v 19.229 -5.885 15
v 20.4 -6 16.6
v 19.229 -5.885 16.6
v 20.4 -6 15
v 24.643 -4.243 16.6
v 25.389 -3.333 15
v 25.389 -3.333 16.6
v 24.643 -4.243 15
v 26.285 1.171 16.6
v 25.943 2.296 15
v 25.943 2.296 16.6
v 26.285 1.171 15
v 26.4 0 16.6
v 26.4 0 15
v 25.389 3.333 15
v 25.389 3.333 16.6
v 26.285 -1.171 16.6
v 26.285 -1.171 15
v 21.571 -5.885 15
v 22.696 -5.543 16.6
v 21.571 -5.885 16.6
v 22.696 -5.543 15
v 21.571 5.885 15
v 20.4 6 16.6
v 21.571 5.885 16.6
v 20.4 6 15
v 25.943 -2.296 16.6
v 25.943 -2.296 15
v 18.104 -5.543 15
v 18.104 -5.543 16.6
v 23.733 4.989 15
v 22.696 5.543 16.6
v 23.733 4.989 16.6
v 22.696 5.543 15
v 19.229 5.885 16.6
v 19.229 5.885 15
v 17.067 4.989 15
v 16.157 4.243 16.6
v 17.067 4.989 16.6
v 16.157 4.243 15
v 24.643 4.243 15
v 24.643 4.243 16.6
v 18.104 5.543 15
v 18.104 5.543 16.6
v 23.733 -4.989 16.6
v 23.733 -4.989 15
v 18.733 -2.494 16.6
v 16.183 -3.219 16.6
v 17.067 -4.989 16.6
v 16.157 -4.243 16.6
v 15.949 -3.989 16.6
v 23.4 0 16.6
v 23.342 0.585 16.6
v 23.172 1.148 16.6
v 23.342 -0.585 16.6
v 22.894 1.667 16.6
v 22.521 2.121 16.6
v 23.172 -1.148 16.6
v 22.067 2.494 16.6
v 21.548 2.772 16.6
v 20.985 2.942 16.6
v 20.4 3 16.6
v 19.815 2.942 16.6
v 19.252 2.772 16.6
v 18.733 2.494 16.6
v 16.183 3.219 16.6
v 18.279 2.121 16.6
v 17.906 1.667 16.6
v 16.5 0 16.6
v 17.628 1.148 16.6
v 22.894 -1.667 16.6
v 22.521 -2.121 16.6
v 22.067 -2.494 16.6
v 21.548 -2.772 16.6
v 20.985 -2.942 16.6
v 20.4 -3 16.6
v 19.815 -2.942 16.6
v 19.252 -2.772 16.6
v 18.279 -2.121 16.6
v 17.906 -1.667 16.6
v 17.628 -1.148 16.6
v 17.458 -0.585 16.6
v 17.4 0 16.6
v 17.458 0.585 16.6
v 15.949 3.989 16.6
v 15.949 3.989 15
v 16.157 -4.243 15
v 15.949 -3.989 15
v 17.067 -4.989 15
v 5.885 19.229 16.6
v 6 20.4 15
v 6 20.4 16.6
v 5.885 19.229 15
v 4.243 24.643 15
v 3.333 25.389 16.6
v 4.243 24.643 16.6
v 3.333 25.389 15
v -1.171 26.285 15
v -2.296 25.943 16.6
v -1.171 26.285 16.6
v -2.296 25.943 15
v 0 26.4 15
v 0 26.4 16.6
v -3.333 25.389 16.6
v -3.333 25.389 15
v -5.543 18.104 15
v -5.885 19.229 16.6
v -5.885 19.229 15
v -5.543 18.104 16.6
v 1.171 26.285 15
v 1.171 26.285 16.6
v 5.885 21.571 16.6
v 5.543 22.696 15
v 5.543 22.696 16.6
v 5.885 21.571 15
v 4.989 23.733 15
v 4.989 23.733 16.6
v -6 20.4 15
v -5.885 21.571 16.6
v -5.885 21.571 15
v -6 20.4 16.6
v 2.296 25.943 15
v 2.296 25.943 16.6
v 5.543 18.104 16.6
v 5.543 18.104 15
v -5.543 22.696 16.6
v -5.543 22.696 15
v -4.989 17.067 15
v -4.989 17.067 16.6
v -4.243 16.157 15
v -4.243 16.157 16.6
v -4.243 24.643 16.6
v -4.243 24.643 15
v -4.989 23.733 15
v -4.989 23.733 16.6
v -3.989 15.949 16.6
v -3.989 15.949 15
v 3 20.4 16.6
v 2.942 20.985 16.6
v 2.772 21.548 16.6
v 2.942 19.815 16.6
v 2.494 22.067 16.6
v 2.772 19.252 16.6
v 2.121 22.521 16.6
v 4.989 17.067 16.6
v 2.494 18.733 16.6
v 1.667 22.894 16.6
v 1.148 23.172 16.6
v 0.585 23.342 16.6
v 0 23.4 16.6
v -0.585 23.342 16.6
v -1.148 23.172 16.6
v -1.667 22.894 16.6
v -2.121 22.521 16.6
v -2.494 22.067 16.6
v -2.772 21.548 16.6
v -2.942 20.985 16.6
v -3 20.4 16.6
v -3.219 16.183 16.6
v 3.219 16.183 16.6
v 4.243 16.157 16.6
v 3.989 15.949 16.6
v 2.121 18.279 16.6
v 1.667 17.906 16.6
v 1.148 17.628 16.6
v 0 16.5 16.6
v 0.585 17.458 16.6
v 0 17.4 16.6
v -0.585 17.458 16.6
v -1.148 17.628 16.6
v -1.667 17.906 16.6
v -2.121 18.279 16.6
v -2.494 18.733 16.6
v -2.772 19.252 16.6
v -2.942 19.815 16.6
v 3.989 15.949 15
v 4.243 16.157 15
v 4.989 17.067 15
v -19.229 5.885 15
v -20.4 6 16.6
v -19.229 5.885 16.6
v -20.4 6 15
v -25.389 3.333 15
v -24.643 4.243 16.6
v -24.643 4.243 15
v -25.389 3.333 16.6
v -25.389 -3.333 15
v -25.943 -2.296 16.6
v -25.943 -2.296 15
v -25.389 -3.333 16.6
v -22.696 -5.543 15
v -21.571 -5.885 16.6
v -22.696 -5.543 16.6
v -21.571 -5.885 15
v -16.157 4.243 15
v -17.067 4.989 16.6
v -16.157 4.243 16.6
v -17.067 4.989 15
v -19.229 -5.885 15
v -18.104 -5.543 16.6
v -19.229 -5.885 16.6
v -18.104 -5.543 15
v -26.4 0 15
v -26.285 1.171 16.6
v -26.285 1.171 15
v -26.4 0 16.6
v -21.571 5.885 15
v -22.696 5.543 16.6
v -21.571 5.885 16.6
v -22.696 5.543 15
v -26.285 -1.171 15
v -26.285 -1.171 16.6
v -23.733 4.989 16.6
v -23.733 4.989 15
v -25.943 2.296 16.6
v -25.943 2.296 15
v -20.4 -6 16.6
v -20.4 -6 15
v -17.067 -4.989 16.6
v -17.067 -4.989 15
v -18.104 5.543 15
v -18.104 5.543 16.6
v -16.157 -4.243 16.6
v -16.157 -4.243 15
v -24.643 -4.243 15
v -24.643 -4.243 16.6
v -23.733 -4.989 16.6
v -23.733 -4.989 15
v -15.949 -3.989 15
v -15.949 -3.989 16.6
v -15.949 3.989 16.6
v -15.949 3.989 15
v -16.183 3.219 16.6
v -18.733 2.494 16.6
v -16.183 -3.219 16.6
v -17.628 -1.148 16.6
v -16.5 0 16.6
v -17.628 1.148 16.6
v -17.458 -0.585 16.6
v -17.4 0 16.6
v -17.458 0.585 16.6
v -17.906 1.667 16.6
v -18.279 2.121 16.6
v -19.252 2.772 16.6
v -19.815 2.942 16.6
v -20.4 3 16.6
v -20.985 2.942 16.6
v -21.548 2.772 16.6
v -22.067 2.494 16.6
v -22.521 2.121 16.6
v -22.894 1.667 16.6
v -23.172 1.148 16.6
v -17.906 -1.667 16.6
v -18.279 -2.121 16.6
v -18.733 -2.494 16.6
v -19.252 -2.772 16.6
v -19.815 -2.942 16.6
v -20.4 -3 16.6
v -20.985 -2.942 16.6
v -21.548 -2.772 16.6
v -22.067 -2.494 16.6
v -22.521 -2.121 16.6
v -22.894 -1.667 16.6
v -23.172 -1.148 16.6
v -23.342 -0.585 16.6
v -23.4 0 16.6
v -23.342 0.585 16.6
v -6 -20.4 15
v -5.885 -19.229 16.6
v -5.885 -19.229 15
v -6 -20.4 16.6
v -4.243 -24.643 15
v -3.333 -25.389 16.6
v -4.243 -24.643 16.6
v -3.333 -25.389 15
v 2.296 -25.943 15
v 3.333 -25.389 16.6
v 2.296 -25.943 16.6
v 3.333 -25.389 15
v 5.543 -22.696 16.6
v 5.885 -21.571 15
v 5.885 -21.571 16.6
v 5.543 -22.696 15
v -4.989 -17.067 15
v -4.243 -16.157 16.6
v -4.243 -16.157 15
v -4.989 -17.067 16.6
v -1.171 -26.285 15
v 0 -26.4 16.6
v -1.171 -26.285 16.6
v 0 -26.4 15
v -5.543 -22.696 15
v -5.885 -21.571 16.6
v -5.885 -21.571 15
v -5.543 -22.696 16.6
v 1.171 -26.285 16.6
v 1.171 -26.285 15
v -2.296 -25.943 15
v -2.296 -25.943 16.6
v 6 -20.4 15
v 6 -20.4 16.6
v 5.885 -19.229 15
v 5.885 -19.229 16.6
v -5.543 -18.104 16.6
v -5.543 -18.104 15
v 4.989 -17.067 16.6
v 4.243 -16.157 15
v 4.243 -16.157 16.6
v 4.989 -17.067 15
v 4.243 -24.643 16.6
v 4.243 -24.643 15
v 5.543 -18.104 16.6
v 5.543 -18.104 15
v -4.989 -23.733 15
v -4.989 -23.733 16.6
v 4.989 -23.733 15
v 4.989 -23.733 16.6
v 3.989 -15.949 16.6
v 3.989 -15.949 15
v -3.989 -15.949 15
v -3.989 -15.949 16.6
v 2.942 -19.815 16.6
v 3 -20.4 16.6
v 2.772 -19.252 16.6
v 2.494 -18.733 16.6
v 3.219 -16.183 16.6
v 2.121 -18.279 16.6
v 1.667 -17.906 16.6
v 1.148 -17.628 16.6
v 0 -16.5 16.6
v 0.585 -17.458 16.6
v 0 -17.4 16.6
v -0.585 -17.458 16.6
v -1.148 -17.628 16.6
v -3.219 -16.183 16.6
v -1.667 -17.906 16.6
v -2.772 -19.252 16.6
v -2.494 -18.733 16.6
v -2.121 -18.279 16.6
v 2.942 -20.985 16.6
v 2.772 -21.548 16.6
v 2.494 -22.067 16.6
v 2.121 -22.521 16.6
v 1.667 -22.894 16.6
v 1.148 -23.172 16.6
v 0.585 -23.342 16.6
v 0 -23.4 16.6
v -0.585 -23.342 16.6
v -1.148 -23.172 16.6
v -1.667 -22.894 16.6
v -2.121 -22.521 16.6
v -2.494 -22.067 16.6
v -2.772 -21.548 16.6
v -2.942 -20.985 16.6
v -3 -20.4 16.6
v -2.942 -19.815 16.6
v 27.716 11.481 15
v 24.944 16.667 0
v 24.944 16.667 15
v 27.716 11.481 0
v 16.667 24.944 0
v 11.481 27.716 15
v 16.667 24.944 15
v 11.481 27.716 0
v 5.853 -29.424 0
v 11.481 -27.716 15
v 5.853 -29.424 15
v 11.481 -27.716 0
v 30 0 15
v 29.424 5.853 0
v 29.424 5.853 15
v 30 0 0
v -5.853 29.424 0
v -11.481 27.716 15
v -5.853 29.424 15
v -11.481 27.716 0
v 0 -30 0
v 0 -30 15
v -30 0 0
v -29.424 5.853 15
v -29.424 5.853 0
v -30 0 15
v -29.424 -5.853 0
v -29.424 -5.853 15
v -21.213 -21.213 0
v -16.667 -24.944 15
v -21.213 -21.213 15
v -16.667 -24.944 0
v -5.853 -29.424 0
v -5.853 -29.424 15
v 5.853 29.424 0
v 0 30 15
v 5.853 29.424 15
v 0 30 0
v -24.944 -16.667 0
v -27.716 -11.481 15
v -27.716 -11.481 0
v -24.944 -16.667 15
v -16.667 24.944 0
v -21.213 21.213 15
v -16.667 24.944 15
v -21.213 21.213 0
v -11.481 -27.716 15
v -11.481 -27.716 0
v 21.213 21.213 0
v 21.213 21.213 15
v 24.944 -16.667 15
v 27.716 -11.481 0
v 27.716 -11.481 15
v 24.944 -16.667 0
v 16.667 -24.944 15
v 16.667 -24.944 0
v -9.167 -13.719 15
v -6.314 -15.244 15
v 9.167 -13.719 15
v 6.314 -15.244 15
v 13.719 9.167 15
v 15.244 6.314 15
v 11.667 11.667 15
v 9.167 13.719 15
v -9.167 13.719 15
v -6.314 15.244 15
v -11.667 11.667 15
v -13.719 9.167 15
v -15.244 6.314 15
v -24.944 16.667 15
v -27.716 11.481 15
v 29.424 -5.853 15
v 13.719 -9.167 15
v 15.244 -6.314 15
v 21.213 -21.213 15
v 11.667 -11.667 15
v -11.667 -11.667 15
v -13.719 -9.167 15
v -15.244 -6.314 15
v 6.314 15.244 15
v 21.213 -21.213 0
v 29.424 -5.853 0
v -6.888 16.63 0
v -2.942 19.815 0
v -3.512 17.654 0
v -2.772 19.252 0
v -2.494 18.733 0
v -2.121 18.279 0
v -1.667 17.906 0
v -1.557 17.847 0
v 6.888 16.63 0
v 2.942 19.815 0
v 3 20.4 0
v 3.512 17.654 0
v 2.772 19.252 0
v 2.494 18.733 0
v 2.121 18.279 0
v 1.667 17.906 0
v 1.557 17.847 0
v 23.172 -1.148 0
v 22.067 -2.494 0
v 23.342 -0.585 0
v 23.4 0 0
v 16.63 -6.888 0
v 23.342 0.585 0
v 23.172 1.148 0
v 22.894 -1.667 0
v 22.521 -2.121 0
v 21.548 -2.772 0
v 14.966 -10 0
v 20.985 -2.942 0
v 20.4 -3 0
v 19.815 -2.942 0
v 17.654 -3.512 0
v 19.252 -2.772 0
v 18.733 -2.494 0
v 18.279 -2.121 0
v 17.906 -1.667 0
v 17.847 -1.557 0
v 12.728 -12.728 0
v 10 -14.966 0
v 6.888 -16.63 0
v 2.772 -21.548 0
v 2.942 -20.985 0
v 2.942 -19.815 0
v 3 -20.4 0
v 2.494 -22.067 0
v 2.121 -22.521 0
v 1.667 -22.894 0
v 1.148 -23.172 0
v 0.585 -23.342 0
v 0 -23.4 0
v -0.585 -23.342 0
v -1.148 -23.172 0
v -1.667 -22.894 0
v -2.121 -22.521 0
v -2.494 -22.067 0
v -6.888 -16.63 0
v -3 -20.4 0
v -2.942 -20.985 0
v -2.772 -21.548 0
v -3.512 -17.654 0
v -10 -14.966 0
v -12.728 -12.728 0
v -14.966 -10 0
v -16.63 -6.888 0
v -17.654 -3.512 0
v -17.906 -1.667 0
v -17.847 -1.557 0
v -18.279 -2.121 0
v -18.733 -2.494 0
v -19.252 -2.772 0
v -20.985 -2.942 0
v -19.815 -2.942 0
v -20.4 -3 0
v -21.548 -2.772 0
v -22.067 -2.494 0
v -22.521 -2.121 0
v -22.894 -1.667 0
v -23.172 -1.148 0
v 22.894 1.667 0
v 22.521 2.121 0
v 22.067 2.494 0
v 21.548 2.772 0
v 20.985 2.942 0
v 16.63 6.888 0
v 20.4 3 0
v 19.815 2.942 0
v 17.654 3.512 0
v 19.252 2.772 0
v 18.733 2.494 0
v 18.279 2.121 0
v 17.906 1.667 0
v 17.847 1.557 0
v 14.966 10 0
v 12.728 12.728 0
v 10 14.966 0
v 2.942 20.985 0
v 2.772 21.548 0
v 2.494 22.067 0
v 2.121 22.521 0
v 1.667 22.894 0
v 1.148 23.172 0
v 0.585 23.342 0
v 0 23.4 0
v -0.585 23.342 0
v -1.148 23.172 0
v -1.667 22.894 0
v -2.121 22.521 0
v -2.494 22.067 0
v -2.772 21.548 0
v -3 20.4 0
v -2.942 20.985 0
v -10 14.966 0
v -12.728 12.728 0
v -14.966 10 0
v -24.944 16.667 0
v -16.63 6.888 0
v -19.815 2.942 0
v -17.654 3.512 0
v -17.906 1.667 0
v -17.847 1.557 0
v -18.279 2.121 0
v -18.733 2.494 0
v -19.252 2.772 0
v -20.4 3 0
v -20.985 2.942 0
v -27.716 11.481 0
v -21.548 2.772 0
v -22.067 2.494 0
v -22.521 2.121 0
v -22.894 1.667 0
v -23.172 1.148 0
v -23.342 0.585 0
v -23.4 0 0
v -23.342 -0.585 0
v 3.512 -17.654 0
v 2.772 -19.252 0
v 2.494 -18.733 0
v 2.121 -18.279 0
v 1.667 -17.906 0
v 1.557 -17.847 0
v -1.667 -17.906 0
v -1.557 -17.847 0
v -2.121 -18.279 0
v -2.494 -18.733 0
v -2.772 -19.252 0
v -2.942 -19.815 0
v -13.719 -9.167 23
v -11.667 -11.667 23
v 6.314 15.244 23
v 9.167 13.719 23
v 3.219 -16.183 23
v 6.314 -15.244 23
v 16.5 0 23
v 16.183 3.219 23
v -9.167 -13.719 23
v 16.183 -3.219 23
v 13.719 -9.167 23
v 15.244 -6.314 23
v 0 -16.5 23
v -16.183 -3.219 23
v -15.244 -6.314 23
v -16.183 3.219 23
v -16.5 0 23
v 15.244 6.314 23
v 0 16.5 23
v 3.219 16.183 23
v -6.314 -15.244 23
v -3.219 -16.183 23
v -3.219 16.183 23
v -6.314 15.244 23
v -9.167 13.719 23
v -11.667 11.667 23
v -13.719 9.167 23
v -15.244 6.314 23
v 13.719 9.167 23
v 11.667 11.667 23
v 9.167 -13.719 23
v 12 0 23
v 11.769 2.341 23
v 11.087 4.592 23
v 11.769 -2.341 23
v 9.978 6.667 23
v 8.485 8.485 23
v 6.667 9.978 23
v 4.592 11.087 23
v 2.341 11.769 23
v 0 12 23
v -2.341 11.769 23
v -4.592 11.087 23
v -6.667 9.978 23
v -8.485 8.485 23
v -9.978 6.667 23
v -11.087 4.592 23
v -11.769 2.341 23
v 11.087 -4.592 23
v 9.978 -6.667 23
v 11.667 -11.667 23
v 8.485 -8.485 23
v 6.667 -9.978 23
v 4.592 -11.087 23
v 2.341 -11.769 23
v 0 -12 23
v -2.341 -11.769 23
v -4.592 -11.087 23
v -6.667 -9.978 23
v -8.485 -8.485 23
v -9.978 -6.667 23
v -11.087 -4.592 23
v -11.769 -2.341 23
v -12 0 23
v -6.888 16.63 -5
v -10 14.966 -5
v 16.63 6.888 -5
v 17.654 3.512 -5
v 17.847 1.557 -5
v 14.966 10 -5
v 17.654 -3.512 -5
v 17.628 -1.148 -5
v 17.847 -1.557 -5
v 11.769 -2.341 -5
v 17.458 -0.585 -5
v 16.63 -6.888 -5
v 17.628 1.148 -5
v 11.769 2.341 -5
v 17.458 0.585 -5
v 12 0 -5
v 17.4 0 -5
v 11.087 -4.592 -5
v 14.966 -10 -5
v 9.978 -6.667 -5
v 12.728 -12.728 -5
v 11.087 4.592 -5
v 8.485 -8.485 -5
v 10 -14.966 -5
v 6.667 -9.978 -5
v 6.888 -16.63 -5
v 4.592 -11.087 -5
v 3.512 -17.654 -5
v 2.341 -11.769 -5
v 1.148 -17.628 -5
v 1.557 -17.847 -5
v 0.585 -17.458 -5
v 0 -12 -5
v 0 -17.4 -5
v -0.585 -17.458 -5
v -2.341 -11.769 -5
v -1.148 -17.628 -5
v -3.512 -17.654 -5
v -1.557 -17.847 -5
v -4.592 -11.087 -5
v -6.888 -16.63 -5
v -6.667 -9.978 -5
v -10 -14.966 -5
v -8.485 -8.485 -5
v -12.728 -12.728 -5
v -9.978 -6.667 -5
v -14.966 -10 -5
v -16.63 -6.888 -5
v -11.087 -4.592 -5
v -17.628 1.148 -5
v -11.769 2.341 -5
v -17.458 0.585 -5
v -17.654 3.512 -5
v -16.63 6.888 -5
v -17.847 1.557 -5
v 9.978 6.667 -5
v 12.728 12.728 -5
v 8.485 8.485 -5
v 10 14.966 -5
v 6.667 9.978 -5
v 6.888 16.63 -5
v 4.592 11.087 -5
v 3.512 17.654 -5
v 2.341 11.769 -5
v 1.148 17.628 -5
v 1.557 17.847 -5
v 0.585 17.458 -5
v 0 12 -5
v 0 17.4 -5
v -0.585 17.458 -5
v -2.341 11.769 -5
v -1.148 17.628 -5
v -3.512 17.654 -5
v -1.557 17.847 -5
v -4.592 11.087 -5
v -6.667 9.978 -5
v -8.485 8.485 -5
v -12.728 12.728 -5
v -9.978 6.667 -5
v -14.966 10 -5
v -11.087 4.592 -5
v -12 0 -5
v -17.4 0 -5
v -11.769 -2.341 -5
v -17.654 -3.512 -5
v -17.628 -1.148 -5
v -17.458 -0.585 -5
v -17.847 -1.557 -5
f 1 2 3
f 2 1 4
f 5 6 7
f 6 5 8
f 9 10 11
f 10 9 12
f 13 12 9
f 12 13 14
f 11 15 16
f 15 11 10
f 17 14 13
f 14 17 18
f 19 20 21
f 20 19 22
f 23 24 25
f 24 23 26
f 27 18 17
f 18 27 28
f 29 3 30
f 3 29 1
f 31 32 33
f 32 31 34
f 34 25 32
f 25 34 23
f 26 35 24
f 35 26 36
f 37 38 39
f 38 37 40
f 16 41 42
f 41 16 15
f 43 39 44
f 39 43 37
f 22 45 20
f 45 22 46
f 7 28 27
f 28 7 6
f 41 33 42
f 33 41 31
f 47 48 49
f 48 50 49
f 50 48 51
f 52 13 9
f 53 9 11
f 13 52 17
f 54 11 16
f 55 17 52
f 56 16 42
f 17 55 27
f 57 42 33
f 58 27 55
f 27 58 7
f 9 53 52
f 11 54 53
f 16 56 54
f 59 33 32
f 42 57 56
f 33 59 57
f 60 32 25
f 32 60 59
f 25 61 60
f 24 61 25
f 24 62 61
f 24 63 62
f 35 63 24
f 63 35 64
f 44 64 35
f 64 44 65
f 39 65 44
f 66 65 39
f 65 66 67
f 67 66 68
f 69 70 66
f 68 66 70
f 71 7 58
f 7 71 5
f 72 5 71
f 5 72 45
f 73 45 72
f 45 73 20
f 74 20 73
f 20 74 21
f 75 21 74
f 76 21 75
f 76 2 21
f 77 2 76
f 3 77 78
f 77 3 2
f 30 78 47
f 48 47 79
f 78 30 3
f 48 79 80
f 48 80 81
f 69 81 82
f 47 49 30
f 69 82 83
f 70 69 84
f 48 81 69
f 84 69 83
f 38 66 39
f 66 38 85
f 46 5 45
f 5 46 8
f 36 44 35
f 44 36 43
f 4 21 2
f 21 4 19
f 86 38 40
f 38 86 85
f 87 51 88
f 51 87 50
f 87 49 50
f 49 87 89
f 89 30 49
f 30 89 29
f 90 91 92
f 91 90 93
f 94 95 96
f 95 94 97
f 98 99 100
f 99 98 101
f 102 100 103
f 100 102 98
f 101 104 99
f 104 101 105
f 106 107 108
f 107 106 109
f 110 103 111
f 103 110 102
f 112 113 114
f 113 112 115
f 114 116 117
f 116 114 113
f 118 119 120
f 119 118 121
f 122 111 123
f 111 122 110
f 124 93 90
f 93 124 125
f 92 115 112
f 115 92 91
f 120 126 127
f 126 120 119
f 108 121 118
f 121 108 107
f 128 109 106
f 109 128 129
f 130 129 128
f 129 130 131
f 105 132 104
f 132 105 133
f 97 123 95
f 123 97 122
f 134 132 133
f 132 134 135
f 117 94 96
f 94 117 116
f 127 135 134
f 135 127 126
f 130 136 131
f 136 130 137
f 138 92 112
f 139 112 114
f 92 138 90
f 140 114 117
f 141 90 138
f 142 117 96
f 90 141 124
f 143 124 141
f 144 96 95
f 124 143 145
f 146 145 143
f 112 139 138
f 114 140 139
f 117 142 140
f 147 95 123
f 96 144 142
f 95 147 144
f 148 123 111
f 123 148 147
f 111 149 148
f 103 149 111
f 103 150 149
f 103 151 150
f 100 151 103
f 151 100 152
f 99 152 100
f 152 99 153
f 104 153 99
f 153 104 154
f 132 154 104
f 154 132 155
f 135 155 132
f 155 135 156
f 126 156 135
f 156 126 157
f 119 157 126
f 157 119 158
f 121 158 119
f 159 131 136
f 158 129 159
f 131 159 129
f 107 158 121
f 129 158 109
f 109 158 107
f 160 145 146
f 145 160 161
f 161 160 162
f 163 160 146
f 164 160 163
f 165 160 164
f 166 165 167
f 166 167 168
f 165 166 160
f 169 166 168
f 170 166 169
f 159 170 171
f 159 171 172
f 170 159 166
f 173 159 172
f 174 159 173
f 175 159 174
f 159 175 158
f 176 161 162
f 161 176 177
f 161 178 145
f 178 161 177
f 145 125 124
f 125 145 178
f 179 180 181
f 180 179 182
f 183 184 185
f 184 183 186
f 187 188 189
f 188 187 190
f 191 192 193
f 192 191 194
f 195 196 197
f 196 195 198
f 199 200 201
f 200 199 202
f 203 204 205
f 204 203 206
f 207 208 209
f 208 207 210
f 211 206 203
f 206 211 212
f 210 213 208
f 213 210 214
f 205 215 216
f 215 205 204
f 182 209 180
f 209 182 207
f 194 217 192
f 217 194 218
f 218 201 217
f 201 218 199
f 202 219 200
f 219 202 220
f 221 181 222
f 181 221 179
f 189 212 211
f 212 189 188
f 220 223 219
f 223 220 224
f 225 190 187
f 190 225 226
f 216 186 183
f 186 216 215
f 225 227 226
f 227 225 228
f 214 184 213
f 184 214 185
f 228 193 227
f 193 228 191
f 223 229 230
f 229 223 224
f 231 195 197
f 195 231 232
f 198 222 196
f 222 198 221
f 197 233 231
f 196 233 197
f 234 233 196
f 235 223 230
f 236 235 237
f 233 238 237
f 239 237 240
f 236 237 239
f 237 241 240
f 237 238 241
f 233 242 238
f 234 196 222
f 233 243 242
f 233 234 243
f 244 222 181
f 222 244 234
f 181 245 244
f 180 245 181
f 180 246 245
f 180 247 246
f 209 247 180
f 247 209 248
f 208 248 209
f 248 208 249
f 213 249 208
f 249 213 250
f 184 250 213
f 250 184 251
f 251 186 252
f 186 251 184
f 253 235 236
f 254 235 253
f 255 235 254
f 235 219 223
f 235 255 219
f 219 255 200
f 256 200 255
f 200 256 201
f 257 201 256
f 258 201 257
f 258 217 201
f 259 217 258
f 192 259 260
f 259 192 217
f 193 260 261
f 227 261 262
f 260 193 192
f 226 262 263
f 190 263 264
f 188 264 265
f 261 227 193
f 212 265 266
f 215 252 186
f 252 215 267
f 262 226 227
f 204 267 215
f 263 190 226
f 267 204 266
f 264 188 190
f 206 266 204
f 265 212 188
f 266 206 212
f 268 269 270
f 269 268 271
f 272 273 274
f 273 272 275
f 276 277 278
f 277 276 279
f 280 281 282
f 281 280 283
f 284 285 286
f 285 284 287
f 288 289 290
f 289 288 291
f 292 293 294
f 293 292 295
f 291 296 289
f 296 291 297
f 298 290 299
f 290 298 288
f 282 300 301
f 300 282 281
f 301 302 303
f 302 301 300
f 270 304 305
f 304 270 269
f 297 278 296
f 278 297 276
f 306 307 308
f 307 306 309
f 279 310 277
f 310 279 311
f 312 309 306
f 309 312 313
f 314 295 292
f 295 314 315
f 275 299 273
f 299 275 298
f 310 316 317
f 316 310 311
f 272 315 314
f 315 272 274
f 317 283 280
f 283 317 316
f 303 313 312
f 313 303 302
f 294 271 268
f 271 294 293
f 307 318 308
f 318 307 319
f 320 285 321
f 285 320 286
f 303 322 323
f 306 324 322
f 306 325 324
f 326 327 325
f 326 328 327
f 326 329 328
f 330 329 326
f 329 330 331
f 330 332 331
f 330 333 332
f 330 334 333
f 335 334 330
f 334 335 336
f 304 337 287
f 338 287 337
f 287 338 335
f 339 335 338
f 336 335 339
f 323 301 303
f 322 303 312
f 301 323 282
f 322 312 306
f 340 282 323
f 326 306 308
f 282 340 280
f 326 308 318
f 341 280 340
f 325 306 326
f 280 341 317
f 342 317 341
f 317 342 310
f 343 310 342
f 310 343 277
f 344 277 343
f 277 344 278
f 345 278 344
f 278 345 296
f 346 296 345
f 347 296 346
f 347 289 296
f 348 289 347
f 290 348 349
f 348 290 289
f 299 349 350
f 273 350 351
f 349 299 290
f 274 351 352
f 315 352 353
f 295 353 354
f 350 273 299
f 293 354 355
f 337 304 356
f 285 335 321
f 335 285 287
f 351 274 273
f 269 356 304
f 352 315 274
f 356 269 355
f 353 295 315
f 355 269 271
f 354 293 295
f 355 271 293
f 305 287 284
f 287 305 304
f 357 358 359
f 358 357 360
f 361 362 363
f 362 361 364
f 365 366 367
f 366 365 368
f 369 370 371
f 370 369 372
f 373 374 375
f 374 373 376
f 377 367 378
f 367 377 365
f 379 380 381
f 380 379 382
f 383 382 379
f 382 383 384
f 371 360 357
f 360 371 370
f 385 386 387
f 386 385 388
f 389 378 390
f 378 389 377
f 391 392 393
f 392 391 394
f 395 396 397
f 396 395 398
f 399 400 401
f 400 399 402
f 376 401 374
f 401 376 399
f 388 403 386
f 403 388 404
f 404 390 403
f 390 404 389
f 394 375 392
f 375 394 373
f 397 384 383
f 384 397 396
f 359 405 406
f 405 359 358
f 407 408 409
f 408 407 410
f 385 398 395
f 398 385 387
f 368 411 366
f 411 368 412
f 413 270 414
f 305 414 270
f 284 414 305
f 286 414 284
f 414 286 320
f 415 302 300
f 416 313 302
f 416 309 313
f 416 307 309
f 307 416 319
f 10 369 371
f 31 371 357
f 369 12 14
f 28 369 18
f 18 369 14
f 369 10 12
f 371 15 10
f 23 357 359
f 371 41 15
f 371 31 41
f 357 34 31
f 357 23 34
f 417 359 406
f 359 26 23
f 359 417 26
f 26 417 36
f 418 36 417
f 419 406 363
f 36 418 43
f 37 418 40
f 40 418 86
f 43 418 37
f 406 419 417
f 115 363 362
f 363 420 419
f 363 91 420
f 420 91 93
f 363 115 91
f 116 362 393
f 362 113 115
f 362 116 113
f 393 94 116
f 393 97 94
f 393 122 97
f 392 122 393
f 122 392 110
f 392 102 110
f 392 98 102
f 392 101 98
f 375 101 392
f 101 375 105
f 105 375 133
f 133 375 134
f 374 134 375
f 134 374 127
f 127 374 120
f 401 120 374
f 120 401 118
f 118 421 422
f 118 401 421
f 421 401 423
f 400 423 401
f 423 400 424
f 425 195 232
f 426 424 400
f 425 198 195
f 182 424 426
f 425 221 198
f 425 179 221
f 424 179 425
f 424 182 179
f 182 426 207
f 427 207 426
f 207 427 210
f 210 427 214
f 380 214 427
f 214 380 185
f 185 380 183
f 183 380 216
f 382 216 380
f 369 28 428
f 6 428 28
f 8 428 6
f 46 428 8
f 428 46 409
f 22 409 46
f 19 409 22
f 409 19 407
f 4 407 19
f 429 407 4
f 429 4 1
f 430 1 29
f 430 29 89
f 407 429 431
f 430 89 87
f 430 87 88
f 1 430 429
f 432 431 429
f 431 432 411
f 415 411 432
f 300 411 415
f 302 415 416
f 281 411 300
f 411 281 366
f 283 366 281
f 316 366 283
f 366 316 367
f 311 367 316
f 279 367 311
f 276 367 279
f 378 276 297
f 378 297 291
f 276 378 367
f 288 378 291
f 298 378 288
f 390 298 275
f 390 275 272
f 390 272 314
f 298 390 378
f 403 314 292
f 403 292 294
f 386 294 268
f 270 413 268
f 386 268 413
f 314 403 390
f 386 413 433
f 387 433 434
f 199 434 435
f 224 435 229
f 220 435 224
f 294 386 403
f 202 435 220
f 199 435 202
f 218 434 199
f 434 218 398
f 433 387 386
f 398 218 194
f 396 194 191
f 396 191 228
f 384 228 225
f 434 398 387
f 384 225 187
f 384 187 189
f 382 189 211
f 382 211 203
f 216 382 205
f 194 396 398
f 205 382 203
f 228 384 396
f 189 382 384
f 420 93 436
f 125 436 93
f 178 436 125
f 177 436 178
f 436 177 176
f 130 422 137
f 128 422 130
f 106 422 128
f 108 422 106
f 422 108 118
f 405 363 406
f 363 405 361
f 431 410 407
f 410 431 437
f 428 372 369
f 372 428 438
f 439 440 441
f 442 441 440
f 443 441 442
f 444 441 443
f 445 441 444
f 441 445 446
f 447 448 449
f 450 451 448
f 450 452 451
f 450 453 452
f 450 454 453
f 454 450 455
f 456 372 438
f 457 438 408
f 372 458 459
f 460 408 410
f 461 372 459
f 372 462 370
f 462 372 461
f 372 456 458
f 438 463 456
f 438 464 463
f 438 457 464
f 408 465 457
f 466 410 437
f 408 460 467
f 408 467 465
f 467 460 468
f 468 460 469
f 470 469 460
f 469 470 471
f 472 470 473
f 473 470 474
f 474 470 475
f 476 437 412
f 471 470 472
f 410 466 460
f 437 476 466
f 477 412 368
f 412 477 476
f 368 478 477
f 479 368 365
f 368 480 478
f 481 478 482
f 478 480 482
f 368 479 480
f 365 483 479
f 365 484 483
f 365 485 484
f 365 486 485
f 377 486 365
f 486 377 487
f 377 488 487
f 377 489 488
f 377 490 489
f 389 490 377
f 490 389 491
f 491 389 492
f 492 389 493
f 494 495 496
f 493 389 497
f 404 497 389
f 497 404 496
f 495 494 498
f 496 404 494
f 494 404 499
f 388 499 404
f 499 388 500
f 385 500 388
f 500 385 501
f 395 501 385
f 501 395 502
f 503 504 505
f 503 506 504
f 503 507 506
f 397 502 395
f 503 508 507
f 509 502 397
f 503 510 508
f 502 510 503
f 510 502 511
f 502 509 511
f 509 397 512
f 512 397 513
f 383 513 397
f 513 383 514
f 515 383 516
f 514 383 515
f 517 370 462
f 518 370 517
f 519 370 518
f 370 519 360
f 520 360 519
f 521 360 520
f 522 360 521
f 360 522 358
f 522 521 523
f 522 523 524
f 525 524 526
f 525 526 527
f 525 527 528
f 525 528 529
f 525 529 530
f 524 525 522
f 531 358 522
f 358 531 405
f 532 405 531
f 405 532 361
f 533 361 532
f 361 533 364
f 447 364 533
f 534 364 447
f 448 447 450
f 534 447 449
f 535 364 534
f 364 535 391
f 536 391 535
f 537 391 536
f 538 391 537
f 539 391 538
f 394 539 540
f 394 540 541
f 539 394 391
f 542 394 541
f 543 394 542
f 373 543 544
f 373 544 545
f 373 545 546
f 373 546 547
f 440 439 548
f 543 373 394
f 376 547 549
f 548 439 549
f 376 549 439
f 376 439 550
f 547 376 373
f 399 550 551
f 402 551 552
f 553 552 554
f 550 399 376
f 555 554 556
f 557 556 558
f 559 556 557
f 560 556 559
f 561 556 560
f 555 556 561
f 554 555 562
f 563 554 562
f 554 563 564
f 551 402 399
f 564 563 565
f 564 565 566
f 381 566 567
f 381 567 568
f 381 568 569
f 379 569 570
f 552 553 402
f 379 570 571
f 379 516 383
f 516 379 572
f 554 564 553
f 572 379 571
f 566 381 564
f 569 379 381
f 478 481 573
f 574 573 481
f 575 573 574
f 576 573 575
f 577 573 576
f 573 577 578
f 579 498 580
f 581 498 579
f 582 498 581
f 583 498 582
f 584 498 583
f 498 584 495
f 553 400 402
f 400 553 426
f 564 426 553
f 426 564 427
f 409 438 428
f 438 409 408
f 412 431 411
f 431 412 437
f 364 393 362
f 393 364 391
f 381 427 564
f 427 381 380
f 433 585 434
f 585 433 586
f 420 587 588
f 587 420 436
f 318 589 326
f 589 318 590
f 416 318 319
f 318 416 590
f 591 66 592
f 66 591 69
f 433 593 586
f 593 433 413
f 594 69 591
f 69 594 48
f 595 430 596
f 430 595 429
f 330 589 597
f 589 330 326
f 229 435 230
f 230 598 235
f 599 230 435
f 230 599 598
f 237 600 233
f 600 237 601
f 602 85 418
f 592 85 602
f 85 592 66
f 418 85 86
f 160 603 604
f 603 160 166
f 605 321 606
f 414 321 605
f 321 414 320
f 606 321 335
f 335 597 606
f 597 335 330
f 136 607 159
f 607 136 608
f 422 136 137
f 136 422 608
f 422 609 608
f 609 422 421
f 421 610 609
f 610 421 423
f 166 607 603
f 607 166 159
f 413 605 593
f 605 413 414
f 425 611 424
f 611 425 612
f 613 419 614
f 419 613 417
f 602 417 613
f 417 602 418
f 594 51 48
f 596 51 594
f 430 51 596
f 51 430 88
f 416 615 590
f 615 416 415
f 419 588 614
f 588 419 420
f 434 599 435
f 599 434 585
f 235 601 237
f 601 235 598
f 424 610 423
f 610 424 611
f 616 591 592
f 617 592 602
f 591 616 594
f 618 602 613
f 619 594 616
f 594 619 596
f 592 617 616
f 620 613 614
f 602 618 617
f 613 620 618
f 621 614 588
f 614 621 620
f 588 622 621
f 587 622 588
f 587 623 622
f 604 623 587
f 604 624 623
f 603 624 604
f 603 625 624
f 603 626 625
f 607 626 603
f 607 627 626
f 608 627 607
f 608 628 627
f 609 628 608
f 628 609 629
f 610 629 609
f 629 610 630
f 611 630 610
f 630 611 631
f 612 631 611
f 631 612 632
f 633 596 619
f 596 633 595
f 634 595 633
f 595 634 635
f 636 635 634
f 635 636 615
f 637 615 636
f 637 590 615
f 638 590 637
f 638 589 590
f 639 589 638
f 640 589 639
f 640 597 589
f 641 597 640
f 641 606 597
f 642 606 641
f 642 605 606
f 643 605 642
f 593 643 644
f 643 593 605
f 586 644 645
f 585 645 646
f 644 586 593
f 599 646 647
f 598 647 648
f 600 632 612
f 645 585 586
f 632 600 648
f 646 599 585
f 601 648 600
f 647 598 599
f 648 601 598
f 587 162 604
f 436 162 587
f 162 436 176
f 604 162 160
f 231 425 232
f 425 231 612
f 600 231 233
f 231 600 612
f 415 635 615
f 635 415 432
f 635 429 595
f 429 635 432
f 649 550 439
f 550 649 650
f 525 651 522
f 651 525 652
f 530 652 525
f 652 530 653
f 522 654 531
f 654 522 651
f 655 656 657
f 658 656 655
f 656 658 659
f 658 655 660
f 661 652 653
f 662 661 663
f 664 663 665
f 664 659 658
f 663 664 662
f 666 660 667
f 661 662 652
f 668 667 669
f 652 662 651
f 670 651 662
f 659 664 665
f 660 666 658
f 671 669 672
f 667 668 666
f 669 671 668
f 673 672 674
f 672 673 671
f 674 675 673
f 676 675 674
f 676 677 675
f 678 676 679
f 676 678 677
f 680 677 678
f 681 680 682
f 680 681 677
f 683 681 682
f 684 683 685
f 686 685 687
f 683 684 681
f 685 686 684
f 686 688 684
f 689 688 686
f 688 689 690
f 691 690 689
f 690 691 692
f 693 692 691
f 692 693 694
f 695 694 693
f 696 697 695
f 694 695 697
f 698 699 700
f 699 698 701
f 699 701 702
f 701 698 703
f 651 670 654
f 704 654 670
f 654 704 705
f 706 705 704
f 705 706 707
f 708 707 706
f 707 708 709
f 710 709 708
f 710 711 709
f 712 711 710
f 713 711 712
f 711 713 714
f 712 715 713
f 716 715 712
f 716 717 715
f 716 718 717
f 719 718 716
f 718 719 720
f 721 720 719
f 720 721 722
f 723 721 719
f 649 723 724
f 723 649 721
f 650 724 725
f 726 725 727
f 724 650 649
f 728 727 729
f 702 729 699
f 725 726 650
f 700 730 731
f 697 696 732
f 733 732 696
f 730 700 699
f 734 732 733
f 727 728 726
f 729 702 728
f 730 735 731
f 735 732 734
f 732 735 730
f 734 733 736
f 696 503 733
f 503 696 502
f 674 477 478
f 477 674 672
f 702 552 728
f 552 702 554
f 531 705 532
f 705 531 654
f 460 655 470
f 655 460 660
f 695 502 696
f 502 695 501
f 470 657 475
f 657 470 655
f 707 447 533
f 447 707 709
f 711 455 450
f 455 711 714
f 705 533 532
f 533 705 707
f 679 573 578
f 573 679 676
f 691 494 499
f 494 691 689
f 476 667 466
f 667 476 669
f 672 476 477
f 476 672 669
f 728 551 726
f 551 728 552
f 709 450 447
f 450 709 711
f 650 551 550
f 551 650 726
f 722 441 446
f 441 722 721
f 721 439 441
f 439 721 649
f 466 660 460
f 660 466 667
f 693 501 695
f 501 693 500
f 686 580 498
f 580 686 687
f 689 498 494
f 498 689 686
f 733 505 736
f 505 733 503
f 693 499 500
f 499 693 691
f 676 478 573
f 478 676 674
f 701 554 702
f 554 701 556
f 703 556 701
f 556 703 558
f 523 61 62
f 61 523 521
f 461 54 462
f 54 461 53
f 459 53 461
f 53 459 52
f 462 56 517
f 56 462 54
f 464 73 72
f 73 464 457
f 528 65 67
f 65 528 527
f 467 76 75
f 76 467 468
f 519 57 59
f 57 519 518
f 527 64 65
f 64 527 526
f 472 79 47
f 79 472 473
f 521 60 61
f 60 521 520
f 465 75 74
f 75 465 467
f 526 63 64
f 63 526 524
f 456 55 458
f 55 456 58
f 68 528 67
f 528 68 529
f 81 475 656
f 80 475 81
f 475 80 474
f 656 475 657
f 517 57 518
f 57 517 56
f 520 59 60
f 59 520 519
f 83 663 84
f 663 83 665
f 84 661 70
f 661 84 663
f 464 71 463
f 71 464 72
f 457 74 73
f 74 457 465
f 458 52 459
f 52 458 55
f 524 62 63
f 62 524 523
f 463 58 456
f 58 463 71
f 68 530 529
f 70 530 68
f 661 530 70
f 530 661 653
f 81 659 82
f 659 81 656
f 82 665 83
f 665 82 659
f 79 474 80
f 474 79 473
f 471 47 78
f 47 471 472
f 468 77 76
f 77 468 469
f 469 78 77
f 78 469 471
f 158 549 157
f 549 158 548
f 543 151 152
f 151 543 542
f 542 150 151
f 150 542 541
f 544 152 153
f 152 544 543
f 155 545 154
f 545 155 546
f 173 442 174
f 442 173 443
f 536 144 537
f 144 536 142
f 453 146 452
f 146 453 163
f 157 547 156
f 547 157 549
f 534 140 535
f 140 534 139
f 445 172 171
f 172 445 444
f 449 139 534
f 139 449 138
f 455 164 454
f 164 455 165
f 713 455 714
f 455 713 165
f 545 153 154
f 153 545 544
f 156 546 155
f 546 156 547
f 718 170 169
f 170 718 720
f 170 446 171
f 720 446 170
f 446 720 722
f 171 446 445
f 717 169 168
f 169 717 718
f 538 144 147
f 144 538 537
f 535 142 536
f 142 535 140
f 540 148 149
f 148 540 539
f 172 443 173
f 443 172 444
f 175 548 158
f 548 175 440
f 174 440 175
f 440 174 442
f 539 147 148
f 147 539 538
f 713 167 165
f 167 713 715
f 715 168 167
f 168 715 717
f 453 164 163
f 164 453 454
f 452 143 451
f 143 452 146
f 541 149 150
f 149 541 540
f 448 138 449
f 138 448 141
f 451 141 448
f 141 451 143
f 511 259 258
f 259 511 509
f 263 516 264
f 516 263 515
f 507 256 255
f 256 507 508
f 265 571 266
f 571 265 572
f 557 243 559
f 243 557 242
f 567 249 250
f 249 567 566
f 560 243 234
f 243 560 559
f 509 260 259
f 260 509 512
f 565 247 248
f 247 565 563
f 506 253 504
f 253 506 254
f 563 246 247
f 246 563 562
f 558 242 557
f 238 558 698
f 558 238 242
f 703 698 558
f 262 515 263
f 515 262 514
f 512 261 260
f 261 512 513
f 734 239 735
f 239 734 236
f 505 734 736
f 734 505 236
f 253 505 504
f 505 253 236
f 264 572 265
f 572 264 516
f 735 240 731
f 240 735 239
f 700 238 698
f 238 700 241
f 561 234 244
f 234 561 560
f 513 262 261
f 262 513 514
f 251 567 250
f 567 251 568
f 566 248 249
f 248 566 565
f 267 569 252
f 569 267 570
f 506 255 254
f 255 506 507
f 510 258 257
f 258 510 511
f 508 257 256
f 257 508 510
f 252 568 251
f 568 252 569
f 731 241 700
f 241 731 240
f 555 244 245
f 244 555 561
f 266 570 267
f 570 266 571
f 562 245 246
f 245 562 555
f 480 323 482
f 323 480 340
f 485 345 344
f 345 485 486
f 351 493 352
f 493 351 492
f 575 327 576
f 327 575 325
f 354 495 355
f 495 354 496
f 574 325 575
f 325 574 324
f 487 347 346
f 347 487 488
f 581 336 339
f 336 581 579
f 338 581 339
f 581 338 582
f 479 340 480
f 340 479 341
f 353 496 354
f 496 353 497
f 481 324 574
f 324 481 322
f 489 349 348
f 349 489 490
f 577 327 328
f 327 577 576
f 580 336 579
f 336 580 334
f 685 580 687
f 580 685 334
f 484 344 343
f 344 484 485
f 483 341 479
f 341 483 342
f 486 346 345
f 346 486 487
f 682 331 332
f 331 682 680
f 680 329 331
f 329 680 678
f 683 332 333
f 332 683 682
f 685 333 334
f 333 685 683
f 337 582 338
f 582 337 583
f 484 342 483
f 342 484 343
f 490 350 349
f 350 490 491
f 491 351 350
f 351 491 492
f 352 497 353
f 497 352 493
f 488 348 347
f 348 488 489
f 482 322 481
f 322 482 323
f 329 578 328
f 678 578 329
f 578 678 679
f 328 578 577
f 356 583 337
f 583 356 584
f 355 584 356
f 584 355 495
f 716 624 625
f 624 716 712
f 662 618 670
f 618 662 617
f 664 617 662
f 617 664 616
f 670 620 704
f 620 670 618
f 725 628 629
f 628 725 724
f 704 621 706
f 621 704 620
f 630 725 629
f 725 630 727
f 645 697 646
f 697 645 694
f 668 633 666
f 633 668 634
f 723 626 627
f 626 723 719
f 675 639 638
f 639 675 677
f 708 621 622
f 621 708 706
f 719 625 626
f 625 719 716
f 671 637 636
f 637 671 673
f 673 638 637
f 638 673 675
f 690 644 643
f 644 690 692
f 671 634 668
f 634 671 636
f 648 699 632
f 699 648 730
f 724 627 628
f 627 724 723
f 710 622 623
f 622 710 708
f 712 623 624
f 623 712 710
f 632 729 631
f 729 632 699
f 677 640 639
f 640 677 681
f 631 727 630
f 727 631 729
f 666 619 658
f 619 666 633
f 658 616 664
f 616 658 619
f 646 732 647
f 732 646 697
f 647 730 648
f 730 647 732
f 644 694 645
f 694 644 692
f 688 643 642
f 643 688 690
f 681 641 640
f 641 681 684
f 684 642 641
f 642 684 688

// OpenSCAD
$fn = 32;

// ----------------------------------------------------------------------
// Bolt-circle flange: 60 mm outside, 4 bolt holes, bore 24 mm
// ----------------------------------------------------------------------

// --- parameters (mm) ---
flange_d = 60;            // flange outside diameter
flange_t = 15;            // flange thickness
bolts = 4;                // number of bolt holes
bolt_d = 6;               // bolt clearance
bolt_r = 20.4;            // bolt circle radius
bore_d = 24;              // centre bore
hub_d = 33;               // raised hub diameter
hub_h = 8;                // raised hub height
spigot_d = 36;            // spigot diameter
spigot_h = 6;             // spigot height below the flange
sink = 1;                 // overlap into the flange
spot_d = 12;              // spot faced bosses
spot_h = 1.6;             // spot face height

module body() {
  cylinder(h = flange_t, d = flange_d);
  /* raised hub, sunk 1 mm into the flange */
  translate([0, 0, flange_t - 1]) cylinder(h = hub_h + 1, d = hub_d);
  /* spigot on the back face, sunk into the flange */
  translate([0, 0, -spigot_h + sink]) cylinder(h = spigot_h, d = spigot_d);
  /* spot faced pads under the bolt heads */
  for (i = [0 : bolts - 1]) rotate([0, 0, i * 360 / bolts]) translate([bolt_r, 0, flange_t - 1]) cylinder(h = spot_h + 1, d = spot_d);
}

difference() {
  body();
  /* bolt circle */
  for (i = [0 : bolts - 1]) rotate([0, 0, i * 360 / bolts]) translate([bolt_r, 0, -spigot_h - 1]) cylinder(h = flange_t + hub_h + spigot_h + 3, d = bolt_d);
  translate([0, 0, -spigot_h - 1]) cylinder(h = flange_t + hub_h + spigot_h + 3, d = bore_d);
}
